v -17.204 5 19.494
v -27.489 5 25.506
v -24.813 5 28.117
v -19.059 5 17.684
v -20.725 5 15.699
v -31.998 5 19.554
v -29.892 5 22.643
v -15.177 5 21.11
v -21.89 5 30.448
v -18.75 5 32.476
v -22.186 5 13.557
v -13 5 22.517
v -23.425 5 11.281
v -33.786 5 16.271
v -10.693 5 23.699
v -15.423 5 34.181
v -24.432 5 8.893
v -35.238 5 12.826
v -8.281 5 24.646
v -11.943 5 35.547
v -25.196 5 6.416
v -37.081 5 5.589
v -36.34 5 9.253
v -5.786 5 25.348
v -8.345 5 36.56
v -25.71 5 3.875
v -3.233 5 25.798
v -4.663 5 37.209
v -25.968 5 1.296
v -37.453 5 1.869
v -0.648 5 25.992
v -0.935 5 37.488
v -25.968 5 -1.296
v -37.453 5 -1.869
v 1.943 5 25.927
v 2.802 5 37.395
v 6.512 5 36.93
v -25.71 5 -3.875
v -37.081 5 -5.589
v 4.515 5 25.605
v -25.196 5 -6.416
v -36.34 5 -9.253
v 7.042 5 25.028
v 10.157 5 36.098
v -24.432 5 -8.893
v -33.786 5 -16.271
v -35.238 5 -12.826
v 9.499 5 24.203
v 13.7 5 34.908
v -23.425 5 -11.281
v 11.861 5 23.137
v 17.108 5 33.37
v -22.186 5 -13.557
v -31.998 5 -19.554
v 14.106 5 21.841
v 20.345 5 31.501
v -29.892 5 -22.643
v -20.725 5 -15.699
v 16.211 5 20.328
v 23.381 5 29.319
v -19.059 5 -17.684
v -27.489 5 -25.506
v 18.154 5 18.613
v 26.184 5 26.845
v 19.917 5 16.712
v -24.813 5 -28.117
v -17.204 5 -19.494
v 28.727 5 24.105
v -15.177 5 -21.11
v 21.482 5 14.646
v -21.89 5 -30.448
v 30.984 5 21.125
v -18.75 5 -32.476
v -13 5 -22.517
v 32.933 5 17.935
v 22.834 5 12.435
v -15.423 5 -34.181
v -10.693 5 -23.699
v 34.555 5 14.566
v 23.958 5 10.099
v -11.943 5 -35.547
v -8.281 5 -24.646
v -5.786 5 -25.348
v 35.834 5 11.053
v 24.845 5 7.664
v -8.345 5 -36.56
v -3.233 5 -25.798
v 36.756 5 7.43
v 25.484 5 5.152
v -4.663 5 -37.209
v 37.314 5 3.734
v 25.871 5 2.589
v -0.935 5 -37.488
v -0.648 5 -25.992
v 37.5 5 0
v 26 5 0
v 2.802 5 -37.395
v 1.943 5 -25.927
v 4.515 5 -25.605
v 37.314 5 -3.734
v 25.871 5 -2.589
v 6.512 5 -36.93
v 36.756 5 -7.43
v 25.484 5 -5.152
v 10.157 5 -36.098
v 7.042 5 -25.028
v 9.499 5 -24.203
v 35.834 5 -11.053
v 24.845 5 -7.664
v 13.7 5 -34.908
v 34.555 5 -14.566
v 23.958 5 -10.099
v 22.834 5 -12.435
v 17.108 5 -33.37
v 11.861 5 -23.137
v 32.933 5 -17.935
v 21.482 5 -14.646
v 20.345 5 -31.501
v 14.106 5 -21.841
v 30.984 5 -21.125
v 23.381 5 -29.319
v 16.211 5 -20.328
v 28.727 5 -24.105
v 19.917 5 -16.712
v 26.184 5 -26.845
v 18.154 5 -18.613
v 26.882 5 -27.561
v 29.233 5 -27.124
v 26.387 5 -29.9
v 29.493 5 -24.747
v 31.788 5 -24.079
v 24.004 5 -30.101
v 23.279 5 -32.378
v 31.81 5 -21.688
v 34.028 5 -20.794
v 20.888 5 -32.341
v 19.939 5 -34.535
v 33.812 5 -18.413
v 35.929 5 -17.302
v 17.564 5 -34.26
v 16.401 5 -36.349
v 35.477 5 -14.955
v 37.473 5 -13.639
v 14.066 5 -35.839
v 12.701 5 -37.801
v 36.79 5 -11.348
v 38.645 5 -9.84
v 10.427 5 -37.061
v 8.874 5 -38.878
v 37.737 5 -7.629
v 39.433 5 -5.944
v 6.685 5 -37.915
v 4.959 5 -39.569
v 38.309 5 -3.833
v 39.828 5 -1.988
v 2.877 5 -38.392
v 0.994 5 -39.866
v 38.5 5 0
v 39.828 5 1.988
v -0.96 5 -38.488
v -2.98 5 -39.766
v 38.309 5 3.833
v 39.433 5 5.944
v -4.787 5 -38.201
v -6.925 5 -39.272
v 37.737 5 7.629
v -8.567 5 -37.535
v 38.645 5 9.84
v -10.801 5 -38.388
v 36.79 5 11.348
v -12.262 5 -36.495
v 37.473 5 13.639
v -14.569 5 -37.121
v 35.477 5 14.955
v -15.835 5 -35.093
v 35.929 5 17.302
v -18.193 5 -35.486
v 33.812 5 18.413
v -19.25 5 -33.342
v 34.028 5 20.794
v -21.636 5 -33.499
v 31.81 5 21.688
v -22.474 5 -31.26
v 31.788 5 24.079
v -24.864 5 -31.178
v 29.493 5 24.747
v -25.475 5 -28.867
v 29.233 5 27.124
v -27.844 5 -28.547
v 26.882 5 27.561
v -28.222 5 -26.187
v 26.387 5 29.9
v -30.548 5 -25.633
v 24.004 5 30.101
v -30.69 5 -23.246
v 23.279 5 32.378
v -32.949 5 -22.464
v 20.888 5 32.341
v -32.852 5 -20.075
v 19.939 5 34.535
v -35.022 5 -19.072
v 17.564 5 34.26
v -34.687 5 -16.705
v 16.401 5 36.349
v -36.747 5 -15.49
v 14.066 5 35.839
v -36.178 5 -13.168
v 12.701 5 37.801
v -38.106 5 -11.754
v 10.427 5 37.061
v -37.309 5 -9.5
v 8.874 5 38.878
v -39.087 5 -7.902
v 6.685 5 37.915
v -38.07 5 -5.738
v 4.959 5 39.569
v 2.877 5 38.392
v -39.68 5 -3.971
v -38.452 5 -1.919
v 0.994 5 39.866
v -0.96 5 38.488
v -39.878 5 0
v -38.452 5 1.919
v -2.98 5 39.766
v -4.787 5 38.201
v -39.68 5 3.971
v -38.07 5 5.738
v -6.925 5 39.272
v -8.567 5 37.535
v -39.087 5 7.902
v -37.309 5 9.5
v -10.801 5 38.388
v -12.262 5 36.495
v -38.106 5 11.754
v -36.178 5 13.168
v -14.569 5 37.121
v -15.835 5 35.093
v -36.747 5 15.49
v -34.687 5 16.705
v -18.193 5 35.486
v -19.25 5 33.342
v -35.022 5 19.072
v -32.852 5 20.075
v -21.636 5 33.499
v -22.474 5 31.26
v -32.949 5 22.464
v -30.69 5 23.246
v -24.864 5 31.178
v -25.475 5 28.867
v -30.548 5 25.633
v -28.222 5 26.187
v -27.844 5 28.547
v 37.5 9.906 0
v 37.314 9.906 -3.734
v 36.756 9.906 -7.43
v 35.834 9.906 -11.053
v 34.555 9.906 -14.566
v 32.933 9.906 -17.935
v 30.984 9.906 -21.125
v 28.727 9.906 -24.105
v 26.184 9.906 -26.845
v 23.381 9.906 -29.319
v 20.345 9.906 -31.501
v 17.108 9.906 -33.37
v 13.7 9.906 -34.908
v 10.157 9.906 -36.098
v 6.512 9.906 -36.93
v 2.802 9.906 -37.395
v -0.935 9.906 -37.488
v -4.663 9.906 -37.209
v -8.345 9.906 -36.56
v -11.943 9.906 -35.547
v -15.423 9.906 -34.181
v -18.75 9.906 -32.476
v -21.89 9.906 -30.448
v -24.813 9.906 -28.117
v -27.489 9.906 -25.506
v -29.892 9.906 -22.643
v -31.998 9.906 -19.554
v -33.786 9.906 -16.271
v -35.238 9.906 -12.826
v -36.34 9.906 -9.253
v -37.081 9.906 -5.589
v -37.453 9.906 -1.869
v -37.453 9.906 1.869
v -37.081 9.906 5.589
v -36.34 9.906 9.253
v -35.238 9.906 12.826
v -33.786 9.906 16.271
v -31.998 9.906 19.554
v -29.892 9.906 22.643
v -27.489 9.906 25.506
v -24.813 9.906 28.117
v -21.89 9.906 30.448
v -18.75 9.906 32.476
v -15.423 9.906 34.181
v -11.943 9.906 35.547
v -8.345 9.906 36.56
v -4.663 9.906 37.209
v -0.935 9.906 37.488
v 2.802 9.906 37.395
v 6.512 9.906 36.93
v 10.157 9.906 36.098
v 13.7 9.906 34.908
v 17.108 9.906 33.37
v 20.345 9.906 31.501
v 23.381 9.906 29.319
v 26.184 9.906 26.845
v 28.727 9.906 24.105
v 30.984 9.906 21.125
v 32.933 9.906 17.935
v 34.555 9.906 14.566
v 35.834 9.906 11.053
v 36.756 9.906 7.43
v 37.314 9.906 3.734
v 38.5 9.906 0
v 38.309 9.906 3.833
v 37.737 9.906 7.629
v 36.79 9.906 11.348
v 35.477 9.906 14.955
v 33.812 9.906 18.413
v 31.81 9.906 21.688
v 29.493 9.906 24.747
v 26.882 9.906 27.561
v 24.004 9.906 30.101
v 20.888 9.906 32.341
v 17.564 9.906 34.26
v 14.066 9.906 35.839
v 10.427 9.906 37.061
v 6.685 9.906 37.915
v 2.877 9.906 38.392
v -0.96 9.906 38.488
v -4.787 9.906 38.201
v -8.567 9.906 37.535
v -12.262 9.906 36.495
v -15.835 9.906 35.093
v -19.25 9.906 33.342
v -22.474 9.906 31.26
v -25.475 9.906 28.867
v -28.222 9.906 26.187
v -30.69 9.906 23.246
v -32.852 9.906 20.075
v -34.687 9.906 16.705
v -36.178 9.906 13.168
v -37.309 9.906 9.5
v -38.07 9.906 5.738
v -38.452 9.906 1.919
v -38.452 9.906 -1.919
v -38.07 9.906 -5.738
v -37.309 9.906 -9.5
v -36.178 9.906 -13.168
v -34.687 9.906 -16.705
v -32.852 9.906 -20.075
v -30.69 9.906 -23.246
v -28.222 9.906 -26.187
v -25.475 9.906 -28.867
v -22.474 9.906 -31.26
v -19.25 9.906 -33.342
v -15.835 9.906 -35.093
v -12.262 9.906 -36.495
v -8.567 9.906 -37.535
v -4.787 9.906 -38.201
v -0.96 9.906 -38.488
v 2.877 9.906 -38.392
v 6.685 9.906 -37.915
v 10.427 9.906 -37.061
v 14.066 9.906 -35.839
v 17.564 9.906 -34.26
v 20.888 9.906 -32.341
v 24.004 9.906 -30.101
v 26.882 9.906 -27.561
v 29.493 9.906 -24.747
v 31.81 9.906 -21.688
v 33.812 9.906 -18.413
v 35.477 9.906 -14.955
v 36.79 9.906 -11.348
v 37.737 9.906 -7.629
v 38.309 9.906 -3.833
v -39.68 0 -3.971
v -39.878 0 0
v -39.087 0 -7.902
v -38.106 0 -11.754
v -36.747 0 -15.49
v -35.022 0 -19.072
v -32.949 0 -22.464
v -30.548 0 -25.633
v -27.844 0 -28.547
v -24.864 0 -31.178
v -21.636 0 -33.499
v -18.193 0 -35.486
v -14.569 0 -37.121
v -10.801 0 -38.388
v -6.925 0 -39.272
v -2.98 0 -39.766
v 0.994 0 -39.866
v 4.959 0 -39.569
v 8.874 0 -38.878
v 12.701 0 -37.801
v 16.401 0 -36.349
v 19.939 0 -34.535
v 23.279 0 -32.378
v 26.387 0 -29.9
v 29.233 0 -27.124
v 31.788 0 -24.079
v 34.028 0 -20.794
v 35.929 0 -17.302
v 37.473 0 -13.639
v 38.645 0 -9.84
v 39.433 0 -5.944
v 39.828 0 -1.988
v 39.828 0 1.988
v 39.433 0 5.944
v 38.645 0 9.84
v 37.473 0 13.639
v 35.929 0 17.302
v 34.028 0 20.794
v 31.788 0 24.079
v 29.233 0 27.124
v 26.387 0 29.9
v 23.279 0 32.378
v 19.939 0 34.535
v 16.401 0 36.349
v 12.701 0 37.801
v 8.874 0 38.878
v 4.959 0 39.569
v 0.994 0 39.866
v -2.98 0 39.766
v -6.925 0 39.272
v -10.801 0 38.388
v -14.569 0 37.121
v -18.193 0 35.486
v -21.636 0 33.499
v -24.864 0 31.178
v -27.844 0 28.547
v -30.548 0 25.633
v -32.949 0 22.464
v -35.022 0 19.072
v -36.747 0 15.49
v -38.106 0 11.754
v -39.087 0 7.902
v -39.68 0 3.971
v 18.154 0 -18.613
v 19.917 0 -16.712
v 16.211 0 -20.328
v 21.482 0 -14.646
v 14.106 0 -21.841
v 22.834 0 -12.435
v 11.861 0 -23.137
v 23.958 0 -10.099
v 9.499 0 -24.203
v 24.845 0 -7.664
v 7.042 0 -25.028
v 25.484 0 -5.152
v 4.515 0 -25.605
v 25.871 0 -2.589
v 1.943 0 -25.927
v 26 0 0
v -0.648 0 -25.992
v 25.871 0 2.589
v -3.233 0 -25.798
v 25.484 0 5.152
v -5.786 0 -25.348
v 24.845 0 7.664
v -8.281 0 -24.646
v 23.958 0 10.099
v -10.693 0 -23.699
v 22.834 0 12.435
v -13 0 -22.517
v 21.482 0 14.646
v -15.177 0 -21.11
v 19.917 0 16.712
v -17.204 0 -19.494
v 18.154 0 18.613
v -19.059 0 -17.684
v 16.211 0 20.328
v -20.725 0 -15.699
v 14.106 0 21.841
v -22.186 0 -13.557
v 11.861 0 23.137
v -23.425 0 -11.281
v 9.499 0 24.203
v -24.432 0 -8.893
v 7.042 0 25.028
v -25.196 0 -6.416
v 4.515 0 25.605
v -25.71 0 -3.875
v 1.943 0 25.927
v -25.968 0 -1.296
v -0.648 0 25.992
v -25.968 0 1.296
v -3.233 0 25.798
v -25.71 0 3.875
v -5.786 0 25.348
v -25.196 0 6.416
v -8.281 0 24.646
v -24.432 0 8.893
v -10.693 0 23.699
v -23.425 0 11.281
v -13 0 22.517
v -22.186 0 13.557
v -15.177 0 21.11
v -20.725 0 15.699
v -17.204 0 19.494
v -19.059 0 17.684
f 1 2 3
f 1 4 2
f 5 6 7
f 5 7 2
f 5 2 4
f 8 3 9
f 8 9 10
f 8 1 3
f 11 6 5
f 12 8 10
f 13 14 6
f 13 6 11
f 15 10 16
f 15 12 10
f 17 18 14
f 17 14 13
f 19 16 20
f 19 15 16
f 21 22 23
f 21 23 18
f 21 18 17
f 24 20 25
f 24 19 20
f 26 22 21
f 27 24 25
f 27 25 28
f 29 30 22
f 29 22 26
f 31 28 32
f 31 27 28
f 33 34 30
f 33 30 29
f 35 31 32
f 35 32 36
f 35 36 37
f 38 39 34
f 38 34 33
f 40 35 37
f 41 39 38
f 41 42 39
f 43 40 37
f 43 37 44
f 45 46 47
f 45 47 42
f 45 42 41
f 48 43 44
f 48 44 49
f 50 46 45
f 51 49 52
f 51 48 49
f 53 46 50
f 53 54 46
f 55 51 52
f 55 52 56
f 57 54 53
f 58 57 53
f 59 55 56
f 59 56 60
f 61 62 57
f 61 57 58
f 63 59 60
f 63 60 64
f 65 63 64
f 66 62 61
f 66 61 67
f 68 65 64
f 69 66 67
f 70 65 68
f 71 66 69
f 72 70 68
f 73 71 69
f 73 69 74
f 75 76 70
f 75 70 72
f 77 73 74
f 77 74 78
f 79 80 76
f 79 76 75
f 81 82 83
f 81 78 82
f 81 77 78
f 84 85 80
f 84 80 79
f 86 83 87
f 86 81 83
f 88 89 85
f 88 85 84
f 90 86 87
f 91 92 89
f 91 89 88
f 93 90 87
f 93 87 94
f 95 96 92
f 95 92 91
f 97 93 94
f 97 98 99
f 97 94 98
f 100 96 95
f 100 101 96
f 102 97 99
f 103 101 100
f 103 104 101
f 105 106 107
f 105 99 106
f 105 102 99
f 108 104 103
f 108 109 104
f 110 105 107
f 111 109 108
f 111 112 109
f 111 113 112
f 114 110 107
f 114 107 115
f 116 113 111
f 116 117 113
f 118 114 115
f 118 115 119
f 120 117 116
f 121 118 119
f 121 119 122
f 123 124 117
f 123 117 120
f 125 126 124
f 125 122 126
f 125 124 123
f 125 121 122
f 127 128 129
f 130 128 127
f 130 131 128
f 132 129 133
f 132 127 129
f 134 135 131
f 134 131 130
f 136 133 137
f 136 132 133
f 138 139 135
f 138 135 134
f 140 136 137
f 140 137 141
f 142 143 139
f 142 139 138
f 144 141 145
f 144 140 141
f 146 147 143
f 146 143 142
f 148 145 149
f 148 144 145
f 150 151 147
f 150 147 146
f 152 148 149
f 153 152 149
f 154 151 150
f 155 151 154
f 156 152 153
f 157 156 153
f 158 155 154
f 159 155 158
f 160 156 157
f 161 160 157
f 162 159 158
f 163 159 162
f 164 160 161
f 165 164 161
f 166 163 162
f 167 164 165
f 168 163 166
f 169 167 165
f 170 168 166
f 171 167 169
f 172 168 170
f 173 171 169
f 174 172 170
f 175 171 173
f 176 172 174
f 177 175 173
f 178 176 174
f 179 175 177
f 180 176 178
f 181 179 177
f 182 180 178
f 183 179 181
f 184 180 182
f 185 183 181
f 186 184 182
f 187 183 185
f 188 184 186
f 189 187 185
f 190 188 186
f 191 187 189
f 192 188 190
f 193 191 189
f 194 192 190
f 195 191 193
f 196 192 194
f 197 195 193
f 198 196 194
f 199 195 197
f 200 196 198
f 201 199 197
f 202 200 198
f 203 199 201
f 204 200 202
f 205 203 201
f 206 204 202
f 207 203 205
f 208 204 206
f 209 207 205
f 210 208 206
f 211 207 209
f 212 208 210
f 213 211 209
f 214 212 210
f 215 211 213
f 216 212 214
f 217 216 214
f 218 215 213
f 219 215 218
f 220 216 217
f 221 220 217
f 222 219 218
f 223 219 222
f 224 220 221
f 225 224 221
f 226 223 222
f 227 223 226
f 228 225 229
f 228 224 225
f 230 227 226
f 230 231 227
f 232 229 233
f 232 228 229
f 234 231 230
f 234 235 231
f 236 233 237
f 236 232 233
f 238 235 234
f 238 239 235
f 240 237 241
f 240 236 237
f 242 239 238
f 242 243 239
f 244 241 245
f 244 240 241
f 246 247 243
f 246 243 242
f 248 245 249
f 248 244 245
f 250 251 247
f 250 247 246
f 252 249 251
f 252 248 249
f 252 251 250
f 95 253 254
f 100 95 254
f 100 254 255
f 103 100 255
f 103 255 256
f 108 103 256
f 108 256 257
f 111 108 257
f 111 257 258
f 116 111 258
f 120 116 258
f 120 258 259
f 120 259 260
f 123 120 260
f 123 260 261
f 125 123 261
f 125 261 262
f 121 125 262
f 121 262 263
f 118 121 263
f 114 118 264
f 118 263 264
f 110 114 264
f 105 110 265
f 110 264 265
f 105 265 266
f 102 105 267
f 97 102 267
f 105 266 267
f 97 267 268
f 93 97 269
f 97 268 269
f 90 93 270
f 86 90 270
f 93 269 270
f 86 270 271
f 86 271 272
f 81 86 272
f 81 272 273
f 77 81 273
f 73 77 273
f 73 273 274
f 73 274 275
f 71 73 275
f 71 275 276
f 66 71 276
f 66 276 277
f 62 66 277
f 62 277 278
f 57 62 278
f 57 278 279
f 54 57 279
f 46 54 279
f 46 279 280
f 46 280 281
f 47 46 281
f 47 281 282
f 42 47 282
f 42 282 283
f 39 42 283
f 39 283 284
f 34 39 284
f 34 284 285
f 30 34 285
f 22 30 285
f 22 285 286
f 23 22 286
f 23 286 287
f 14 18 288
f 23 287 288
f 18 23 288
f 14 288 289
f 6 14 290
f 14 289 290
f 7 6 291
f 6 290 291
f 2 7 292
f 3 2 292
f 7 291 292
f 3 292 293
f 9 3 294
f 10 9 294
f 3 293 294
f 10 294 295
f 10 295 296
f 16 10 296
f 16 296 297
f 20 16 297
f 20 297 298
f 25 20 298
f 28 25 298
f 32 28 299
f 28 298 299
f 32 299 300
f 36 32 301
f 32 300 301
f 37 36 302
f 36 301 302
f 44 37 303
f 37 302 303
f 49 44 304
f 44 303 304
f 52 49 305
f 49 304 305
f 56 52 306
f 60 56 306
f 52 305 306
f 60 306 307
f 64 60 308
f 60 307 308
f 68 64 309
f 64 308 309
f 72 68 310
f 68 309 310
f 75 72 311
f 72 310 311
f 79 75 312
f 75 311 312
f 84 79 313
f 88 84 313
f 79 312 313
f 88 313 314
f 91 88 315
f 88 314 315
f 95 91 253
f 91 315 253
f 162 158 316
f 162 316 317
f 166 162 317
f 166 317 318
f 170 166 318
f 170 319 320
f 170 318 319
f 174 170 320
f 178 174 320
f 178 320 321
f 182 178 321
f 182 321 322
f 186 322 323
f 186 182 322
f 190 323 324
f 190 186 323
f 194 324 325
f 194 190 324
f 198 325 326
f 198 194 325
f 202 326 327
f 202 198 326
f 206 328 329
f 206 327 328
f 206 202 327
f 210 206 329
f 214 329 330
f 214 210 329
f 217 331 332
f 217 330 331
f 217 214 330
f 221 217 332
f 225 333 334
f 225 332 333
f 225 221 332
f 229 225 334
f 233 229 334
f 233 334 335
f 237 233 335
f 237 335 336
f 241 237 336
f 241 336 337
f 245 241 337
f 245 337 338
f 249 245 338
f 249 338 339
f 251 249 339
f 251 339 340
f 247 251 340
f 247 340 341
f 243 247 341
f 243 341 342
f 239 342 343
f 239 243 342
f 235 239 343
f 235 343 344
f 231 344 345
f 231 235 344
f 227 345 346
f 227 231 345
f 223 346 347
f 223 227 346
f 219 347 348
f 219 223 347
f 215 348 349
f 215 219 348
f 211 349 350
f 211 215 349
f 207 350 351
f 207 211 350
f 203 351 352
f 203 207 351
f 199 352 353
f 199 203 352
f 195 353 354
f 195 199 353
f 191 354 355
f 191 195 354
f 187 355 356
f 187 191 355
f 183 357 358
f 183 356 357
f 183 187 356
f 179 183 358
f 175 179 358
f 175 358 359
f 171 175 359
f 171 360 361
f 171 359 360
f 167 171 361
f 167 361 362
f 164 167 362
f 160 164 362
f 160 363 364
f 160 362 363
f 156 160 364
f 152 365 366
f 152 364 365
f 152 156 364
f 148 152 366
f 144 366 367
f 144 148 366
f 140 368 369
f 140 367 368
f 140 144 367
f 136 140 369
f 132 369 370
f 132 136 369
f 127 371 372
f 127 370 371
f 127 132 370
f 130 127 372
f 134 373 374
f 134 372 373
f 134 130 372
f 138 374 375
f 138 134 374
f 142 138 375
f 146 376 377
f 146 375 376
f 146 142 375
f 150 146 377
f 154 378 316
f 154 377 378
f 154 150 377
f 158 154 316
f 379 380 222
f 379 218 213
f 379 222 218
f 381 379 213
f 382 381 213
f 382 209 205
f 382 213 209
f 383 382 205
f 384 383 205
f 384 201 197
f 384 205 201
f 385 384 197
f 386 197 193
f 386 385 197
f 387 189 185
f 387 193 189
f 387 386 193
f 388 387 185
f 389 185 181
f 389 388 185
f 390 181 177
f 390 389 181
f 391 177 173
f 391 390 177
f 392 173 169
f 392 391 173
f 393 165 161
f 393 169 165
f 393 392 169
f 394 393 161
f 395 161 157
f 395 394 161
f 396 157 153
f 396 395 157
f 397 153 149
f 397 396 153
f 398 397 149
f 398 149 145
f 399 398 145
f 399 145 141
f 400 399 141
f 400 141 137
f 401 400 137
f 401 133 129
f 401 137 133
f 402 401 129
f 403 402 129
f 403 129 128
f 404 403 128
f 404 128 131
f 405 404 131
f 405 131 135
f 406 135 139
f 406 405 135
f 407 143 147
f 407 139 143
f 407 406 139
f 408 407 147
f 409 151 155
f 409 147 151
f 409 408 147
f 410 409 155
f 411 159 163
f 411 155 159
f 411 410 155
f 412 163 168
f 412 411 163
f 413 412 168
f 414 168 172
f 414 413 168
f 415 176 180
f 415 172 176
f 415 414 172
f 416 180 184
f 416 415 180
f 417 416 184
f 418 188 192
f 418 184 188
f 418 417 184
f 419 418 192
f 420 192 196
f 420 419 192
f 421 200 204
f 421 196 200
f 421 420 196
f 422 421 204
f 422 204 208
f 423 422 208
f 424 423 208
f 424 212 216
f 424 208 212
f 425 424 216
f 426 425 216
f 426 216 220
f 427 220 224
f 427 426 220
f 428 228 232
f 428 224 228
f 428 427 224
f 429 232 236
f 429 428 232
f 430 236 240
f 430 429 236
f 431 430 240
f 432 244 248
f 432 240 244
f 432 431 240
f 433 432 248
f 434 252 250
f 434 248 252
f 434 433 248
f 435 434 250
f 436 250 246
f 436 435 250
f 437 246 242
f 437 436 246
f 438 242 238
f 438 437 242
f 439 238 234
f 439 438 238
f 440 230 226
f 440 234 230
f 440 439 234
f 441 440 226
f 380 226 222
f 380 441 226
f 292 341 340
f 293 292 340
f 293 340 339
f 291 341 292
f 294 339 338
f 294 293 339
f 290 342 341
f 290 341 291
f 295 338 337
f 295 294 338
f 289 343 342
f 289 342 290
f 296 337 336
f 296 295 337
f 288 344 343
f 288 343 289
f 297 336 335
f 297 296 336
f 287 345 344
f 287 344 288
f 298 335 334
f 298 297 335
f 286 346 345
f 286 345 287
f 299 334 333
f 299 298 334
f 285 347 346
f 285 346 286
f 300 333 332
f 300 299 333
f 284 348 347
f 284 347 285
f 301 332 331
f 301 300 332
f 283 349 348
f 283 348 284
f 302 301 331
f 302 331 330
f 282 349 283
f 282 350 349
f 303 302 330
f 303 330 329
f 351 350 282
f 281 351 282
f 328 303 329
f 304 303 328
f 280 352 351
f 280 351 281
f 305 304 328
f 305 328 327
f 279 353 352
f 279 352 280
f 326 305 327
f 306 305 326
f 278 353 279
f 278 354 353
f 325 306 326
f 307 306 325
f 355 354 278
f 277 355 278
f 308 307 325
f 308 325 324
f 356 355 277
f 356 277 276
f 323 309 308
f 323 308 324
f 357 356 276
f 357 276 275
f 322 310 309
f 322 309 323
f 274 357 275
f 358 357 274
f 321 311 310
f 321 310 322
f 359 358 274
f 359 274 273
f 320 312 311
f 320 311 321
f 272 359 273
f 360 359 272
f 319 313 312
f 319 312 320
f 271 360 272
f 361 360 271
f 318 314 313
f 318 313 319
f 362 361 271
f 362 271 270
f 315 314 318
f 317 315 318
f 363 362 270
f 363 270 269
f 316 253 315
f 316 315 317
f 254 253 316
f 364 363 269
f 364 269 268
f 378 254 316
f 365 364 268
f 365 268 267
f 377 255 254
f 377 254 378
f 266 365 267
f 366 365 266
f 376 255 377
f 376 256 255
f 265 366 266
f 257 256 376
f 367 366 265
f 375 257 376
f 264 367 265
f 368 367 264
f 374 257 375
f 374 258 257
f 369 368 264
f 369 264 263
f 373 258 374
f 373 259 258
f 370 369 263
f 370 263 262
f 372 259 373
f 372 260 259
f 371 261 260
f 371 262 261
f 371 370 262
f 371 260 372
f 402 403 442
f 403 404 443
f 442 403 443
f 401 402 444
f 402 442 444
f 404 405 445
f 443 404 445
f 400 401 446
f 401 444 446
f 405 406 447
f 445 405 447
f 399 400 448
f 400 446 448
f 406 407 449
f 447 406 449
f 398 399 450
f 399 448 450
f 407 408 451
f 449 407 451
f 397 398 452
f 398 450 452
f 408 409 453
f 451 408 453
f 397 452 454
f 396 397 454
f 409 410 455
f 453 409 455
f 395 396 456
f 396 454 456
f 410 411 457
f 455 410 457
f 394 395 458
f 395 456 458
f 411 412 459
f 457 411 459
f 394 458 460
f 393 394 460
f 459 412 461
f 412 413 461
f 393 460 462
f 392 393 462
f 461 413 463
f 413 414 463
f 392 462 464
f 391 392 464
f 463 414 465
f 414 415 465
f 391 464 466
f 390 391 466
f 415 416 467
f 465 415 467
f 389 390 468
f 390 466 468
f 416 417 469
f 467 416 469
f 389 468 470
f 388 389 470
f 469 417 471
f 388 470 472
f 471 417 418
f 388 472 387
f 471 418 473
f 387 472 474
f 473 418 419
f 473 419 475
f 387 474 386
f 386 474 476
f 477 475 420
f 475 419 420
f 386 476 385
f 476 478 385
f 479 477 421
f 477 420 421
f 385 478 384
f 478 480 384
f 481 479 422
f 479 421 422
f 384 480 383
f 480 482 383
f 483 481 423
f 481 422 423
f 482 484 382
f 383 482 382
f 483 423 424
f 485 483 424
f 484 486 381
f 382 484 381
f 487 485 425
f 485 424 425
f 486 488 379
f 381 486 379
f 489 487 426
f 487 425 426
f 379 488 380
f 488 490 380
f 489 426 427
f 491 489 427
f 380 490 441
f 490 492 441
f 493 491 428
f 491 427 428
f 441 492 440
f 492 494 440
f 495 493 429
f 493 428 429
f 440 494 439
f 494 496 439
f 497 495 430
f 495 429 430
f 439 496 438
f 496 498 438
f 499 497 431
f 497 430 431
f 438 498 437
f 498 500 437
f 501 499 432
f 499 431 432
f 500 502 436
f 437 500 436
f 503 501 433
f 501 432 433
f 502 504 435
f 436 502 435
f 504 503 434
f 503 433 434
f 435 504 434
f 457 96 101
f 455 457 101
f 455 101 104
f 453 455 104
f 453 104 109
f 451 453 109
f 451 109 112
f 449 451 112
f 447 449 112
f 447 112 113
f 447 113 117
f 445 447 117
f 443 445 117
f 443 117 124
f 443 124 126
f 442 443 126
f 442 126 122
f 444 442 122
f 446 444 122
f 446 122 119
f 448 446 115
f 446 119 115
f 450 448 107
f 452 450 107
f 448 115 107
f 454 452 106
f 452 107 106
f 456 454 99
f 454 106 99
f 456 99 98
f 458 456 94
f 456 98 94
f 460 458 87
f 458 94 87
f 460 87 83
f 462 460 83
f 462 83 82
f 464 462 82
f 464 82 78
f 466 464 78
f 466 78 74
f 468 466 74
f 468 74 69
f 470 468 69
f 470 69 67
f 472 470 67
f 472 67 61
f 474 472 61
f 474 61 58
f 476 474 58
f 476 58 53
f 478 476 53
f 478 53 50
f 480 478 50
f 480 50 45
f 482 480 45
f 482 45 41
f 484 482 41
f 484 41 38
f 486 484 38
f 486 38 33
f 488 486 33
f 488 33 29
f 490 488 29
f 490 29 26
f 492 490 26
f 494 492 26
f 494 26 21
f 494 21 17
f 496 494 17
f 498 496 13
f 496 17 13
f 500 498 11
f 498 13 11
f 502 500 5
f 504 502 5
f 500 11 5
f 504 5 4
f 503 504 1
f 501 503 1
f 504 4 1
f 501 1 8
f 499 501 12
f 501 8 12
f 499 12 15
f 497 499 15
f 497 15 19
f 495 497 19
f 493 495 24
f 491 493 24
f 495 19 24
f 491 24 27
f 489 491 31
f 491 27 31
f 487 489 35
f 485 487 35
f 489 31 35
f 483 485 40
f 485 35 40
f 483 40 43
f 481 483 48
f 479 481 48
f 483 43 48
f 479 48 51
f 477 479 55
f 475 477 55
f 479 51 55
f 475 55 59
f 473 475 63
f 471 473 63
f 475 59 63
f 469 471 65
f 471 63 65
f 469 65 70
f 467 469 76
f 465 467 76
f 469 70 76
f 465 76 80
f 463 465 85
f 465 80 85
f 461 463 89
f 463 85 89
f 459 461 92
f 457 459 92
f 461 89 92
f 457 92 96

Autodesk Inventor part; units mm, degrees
ref_plane "YZ Plane" through (0, 0, 0) normal (1, 0, 0) x (0, 1, 0)
ref_plane "XZ Plane" through (0, 0, 0) normal (0, 1, 0) x (-1, 0, 0)
ref_plane "XY Plane" through (0, 0, 0) normal (0, 0, 1) x (1, 0, 0)
sketch "Sketch1" plane through (0, 0, 0) normal (0, 1, 0) x (-1, 0, 0)
  circle A0 centre (0, 0) radius 39.878
  dimension "d0" = 79.756
extrude "Extrusion1" add sketch "Sketch1" along normal blind 5
sketch "Sketch2" plane through (0, 5, 0) normal (0, 1, 0) x (1, 0, 0)
  circle A0 centre (0, 0) radius 26
  dimension "d3" = 52
extrude "Extrusion2" cut sketch "Sketch2" against normal blind 5
thread "Thread1" size "2 1/16-16 UNS" class "2B" standard "ANSI Unified Screw Threads" length 6.35
sketch "Sketch3" plane through (0, 5, 0) normal (0, 1, 0) x (1, 0, 0)
  circle A0 centre (0, 0) radius 38.5
  dimension "d8" = 77
extrude "Extrusion3" add sketch "Sketch3" along normal blind 4.906
sketch "Sketch4" plane through (0, 9.906, 0) normal (0, 1, 0) x (1, 0, 0)
  circle A0 centre (0, 0) radius 37.5
  dimension "d11" = 75
extrude "Extrusion4" cut sketch "Sketch4" against normal blind 4.906
thread "Thread3" size "3 1/8-16 UN" class "2A" standard "ANSI Unified Screw Threads" full length
properties part number "77mm to 52mm" material "Aluminum 6061-AHC"
